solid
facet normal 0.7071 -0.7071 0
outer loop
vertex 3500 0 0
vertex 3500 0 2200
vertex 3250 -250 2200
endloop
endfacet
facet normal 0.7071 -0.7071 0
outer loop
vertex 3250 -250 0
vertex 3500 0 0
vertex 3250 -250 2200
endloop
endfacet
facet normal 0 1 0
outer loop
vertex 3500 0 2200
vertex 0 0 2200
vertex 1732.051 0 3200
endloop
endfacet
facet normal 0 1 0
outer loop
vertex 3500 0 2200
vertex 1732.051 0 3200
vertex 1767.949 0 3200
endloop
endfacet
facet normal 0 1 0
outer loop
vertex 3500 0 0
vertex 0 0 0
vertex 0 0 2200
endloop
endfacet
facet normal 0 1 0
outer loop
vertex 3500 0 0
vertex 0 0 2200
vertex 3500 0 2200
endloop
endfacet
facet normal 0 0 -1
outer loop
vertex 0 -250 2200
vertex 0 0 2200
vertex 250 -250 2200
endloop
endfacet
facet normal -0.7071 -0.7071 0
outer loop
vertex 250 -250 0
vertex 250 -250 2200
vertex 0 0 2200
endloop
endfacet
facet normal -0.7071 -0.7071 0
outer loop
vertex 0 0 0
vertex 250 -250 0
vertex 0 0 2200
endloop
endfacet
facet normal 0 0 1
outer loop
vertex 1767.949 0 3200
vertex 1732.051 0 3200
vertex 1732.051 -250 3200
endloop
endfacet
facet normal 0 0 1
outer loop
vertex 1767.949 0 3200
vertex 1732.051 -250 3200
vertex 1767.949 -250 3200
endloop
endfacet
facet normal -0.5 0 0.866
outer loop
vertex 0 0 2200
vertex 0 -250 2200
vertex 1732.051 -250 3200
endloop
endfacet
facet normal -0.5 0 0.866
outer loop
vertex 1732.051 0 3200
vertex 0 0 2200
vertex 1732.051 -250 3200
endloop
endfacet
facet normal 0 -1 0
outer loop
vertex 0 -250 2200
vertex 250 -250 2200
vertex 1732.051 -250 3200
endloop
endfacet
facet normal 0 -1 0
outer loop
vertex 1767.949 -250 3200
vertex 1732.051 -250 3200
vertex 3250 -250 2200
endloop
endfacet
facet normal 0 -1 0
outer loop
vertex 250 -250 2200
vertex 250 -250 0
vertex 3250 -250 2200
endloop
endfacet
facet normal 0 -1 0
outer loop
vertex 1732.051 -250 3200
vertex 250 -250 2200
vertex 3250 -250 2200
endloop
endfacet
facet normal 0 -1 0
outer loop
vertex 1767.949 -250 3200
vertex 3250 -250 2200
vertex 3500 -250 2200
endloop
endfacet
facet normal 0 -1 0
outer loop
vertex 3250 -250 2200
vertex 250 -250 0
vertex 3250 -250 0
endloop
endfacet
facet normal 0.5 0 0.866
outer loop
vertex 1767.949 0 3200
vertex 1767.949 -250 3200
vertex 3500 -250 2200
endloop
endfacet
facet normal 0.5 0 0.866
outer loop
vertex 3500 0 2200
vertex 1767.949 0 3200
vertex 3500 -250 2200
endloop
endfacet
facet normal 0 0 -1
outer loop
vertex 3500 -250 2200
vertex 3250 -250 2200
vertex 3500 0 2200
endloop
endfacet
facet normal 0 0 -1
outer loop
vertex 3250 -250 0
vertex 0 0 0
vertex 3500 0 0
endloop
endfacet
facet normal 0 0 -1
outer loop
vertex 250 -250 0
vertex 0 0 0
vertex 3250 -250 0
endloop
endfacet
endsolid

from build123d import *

# Parameters (mm, degrees)
F0_W     = 3500
F0_H     = 2200
F1_DEPTH = 250
F3_DEPTH = 2200.001
F4_W     = 3500
F4_H     = 250
F5_DEPTH = 1000
F7_DEPTH = 250.001


with BuildPart() as f1:
    # F0 (on Front) → F1 (new body)
    with BuildSketch(Plane.XZ):
        with Locations((1750, 1100)):
            Rectangle(F0_W, F0_H)
    extrude(amount=F1_DEPTH)

    # F2 (on face) → F3 (cut, through all)
    with BuildSketch(Plane.XY.offset(2200)):
        Polygon((250, -250), (0, 0), (0, -250), align=None)
        Polygon((3250, -250), (3500, -250), (3500, 0), align=None)
    extrude(amount=-F3_DEPTH, mode=Mode.SUBTRACT)

    # F4 (on face) → F5 (join)
    with BuildSketch(Plane.XY.offset(2200)):
        with Locations((1750, -125)):
            Rectangle(F4_W, F4_H)
    extrude(amount=F5_DEPTH)

    # F6 (on face) → F7 (cut, through all)
    with BuildSketch(Plane.XZ.offset(250)):
        Polygon((0, 3200), (0, 2200), (1732.050808, 3200), align=None)
        Polygon((3500, 3200), (1767.949192, 3200), (3500, 2200), align=None)
        Polygon((1750, 3210.362971), (1732.050808, 3200), (1767.949192, 3200), align=None)
    extrude(amount=-F7_DEPTH, mode=Mode.SUBTRACT)


solid = f1.part
